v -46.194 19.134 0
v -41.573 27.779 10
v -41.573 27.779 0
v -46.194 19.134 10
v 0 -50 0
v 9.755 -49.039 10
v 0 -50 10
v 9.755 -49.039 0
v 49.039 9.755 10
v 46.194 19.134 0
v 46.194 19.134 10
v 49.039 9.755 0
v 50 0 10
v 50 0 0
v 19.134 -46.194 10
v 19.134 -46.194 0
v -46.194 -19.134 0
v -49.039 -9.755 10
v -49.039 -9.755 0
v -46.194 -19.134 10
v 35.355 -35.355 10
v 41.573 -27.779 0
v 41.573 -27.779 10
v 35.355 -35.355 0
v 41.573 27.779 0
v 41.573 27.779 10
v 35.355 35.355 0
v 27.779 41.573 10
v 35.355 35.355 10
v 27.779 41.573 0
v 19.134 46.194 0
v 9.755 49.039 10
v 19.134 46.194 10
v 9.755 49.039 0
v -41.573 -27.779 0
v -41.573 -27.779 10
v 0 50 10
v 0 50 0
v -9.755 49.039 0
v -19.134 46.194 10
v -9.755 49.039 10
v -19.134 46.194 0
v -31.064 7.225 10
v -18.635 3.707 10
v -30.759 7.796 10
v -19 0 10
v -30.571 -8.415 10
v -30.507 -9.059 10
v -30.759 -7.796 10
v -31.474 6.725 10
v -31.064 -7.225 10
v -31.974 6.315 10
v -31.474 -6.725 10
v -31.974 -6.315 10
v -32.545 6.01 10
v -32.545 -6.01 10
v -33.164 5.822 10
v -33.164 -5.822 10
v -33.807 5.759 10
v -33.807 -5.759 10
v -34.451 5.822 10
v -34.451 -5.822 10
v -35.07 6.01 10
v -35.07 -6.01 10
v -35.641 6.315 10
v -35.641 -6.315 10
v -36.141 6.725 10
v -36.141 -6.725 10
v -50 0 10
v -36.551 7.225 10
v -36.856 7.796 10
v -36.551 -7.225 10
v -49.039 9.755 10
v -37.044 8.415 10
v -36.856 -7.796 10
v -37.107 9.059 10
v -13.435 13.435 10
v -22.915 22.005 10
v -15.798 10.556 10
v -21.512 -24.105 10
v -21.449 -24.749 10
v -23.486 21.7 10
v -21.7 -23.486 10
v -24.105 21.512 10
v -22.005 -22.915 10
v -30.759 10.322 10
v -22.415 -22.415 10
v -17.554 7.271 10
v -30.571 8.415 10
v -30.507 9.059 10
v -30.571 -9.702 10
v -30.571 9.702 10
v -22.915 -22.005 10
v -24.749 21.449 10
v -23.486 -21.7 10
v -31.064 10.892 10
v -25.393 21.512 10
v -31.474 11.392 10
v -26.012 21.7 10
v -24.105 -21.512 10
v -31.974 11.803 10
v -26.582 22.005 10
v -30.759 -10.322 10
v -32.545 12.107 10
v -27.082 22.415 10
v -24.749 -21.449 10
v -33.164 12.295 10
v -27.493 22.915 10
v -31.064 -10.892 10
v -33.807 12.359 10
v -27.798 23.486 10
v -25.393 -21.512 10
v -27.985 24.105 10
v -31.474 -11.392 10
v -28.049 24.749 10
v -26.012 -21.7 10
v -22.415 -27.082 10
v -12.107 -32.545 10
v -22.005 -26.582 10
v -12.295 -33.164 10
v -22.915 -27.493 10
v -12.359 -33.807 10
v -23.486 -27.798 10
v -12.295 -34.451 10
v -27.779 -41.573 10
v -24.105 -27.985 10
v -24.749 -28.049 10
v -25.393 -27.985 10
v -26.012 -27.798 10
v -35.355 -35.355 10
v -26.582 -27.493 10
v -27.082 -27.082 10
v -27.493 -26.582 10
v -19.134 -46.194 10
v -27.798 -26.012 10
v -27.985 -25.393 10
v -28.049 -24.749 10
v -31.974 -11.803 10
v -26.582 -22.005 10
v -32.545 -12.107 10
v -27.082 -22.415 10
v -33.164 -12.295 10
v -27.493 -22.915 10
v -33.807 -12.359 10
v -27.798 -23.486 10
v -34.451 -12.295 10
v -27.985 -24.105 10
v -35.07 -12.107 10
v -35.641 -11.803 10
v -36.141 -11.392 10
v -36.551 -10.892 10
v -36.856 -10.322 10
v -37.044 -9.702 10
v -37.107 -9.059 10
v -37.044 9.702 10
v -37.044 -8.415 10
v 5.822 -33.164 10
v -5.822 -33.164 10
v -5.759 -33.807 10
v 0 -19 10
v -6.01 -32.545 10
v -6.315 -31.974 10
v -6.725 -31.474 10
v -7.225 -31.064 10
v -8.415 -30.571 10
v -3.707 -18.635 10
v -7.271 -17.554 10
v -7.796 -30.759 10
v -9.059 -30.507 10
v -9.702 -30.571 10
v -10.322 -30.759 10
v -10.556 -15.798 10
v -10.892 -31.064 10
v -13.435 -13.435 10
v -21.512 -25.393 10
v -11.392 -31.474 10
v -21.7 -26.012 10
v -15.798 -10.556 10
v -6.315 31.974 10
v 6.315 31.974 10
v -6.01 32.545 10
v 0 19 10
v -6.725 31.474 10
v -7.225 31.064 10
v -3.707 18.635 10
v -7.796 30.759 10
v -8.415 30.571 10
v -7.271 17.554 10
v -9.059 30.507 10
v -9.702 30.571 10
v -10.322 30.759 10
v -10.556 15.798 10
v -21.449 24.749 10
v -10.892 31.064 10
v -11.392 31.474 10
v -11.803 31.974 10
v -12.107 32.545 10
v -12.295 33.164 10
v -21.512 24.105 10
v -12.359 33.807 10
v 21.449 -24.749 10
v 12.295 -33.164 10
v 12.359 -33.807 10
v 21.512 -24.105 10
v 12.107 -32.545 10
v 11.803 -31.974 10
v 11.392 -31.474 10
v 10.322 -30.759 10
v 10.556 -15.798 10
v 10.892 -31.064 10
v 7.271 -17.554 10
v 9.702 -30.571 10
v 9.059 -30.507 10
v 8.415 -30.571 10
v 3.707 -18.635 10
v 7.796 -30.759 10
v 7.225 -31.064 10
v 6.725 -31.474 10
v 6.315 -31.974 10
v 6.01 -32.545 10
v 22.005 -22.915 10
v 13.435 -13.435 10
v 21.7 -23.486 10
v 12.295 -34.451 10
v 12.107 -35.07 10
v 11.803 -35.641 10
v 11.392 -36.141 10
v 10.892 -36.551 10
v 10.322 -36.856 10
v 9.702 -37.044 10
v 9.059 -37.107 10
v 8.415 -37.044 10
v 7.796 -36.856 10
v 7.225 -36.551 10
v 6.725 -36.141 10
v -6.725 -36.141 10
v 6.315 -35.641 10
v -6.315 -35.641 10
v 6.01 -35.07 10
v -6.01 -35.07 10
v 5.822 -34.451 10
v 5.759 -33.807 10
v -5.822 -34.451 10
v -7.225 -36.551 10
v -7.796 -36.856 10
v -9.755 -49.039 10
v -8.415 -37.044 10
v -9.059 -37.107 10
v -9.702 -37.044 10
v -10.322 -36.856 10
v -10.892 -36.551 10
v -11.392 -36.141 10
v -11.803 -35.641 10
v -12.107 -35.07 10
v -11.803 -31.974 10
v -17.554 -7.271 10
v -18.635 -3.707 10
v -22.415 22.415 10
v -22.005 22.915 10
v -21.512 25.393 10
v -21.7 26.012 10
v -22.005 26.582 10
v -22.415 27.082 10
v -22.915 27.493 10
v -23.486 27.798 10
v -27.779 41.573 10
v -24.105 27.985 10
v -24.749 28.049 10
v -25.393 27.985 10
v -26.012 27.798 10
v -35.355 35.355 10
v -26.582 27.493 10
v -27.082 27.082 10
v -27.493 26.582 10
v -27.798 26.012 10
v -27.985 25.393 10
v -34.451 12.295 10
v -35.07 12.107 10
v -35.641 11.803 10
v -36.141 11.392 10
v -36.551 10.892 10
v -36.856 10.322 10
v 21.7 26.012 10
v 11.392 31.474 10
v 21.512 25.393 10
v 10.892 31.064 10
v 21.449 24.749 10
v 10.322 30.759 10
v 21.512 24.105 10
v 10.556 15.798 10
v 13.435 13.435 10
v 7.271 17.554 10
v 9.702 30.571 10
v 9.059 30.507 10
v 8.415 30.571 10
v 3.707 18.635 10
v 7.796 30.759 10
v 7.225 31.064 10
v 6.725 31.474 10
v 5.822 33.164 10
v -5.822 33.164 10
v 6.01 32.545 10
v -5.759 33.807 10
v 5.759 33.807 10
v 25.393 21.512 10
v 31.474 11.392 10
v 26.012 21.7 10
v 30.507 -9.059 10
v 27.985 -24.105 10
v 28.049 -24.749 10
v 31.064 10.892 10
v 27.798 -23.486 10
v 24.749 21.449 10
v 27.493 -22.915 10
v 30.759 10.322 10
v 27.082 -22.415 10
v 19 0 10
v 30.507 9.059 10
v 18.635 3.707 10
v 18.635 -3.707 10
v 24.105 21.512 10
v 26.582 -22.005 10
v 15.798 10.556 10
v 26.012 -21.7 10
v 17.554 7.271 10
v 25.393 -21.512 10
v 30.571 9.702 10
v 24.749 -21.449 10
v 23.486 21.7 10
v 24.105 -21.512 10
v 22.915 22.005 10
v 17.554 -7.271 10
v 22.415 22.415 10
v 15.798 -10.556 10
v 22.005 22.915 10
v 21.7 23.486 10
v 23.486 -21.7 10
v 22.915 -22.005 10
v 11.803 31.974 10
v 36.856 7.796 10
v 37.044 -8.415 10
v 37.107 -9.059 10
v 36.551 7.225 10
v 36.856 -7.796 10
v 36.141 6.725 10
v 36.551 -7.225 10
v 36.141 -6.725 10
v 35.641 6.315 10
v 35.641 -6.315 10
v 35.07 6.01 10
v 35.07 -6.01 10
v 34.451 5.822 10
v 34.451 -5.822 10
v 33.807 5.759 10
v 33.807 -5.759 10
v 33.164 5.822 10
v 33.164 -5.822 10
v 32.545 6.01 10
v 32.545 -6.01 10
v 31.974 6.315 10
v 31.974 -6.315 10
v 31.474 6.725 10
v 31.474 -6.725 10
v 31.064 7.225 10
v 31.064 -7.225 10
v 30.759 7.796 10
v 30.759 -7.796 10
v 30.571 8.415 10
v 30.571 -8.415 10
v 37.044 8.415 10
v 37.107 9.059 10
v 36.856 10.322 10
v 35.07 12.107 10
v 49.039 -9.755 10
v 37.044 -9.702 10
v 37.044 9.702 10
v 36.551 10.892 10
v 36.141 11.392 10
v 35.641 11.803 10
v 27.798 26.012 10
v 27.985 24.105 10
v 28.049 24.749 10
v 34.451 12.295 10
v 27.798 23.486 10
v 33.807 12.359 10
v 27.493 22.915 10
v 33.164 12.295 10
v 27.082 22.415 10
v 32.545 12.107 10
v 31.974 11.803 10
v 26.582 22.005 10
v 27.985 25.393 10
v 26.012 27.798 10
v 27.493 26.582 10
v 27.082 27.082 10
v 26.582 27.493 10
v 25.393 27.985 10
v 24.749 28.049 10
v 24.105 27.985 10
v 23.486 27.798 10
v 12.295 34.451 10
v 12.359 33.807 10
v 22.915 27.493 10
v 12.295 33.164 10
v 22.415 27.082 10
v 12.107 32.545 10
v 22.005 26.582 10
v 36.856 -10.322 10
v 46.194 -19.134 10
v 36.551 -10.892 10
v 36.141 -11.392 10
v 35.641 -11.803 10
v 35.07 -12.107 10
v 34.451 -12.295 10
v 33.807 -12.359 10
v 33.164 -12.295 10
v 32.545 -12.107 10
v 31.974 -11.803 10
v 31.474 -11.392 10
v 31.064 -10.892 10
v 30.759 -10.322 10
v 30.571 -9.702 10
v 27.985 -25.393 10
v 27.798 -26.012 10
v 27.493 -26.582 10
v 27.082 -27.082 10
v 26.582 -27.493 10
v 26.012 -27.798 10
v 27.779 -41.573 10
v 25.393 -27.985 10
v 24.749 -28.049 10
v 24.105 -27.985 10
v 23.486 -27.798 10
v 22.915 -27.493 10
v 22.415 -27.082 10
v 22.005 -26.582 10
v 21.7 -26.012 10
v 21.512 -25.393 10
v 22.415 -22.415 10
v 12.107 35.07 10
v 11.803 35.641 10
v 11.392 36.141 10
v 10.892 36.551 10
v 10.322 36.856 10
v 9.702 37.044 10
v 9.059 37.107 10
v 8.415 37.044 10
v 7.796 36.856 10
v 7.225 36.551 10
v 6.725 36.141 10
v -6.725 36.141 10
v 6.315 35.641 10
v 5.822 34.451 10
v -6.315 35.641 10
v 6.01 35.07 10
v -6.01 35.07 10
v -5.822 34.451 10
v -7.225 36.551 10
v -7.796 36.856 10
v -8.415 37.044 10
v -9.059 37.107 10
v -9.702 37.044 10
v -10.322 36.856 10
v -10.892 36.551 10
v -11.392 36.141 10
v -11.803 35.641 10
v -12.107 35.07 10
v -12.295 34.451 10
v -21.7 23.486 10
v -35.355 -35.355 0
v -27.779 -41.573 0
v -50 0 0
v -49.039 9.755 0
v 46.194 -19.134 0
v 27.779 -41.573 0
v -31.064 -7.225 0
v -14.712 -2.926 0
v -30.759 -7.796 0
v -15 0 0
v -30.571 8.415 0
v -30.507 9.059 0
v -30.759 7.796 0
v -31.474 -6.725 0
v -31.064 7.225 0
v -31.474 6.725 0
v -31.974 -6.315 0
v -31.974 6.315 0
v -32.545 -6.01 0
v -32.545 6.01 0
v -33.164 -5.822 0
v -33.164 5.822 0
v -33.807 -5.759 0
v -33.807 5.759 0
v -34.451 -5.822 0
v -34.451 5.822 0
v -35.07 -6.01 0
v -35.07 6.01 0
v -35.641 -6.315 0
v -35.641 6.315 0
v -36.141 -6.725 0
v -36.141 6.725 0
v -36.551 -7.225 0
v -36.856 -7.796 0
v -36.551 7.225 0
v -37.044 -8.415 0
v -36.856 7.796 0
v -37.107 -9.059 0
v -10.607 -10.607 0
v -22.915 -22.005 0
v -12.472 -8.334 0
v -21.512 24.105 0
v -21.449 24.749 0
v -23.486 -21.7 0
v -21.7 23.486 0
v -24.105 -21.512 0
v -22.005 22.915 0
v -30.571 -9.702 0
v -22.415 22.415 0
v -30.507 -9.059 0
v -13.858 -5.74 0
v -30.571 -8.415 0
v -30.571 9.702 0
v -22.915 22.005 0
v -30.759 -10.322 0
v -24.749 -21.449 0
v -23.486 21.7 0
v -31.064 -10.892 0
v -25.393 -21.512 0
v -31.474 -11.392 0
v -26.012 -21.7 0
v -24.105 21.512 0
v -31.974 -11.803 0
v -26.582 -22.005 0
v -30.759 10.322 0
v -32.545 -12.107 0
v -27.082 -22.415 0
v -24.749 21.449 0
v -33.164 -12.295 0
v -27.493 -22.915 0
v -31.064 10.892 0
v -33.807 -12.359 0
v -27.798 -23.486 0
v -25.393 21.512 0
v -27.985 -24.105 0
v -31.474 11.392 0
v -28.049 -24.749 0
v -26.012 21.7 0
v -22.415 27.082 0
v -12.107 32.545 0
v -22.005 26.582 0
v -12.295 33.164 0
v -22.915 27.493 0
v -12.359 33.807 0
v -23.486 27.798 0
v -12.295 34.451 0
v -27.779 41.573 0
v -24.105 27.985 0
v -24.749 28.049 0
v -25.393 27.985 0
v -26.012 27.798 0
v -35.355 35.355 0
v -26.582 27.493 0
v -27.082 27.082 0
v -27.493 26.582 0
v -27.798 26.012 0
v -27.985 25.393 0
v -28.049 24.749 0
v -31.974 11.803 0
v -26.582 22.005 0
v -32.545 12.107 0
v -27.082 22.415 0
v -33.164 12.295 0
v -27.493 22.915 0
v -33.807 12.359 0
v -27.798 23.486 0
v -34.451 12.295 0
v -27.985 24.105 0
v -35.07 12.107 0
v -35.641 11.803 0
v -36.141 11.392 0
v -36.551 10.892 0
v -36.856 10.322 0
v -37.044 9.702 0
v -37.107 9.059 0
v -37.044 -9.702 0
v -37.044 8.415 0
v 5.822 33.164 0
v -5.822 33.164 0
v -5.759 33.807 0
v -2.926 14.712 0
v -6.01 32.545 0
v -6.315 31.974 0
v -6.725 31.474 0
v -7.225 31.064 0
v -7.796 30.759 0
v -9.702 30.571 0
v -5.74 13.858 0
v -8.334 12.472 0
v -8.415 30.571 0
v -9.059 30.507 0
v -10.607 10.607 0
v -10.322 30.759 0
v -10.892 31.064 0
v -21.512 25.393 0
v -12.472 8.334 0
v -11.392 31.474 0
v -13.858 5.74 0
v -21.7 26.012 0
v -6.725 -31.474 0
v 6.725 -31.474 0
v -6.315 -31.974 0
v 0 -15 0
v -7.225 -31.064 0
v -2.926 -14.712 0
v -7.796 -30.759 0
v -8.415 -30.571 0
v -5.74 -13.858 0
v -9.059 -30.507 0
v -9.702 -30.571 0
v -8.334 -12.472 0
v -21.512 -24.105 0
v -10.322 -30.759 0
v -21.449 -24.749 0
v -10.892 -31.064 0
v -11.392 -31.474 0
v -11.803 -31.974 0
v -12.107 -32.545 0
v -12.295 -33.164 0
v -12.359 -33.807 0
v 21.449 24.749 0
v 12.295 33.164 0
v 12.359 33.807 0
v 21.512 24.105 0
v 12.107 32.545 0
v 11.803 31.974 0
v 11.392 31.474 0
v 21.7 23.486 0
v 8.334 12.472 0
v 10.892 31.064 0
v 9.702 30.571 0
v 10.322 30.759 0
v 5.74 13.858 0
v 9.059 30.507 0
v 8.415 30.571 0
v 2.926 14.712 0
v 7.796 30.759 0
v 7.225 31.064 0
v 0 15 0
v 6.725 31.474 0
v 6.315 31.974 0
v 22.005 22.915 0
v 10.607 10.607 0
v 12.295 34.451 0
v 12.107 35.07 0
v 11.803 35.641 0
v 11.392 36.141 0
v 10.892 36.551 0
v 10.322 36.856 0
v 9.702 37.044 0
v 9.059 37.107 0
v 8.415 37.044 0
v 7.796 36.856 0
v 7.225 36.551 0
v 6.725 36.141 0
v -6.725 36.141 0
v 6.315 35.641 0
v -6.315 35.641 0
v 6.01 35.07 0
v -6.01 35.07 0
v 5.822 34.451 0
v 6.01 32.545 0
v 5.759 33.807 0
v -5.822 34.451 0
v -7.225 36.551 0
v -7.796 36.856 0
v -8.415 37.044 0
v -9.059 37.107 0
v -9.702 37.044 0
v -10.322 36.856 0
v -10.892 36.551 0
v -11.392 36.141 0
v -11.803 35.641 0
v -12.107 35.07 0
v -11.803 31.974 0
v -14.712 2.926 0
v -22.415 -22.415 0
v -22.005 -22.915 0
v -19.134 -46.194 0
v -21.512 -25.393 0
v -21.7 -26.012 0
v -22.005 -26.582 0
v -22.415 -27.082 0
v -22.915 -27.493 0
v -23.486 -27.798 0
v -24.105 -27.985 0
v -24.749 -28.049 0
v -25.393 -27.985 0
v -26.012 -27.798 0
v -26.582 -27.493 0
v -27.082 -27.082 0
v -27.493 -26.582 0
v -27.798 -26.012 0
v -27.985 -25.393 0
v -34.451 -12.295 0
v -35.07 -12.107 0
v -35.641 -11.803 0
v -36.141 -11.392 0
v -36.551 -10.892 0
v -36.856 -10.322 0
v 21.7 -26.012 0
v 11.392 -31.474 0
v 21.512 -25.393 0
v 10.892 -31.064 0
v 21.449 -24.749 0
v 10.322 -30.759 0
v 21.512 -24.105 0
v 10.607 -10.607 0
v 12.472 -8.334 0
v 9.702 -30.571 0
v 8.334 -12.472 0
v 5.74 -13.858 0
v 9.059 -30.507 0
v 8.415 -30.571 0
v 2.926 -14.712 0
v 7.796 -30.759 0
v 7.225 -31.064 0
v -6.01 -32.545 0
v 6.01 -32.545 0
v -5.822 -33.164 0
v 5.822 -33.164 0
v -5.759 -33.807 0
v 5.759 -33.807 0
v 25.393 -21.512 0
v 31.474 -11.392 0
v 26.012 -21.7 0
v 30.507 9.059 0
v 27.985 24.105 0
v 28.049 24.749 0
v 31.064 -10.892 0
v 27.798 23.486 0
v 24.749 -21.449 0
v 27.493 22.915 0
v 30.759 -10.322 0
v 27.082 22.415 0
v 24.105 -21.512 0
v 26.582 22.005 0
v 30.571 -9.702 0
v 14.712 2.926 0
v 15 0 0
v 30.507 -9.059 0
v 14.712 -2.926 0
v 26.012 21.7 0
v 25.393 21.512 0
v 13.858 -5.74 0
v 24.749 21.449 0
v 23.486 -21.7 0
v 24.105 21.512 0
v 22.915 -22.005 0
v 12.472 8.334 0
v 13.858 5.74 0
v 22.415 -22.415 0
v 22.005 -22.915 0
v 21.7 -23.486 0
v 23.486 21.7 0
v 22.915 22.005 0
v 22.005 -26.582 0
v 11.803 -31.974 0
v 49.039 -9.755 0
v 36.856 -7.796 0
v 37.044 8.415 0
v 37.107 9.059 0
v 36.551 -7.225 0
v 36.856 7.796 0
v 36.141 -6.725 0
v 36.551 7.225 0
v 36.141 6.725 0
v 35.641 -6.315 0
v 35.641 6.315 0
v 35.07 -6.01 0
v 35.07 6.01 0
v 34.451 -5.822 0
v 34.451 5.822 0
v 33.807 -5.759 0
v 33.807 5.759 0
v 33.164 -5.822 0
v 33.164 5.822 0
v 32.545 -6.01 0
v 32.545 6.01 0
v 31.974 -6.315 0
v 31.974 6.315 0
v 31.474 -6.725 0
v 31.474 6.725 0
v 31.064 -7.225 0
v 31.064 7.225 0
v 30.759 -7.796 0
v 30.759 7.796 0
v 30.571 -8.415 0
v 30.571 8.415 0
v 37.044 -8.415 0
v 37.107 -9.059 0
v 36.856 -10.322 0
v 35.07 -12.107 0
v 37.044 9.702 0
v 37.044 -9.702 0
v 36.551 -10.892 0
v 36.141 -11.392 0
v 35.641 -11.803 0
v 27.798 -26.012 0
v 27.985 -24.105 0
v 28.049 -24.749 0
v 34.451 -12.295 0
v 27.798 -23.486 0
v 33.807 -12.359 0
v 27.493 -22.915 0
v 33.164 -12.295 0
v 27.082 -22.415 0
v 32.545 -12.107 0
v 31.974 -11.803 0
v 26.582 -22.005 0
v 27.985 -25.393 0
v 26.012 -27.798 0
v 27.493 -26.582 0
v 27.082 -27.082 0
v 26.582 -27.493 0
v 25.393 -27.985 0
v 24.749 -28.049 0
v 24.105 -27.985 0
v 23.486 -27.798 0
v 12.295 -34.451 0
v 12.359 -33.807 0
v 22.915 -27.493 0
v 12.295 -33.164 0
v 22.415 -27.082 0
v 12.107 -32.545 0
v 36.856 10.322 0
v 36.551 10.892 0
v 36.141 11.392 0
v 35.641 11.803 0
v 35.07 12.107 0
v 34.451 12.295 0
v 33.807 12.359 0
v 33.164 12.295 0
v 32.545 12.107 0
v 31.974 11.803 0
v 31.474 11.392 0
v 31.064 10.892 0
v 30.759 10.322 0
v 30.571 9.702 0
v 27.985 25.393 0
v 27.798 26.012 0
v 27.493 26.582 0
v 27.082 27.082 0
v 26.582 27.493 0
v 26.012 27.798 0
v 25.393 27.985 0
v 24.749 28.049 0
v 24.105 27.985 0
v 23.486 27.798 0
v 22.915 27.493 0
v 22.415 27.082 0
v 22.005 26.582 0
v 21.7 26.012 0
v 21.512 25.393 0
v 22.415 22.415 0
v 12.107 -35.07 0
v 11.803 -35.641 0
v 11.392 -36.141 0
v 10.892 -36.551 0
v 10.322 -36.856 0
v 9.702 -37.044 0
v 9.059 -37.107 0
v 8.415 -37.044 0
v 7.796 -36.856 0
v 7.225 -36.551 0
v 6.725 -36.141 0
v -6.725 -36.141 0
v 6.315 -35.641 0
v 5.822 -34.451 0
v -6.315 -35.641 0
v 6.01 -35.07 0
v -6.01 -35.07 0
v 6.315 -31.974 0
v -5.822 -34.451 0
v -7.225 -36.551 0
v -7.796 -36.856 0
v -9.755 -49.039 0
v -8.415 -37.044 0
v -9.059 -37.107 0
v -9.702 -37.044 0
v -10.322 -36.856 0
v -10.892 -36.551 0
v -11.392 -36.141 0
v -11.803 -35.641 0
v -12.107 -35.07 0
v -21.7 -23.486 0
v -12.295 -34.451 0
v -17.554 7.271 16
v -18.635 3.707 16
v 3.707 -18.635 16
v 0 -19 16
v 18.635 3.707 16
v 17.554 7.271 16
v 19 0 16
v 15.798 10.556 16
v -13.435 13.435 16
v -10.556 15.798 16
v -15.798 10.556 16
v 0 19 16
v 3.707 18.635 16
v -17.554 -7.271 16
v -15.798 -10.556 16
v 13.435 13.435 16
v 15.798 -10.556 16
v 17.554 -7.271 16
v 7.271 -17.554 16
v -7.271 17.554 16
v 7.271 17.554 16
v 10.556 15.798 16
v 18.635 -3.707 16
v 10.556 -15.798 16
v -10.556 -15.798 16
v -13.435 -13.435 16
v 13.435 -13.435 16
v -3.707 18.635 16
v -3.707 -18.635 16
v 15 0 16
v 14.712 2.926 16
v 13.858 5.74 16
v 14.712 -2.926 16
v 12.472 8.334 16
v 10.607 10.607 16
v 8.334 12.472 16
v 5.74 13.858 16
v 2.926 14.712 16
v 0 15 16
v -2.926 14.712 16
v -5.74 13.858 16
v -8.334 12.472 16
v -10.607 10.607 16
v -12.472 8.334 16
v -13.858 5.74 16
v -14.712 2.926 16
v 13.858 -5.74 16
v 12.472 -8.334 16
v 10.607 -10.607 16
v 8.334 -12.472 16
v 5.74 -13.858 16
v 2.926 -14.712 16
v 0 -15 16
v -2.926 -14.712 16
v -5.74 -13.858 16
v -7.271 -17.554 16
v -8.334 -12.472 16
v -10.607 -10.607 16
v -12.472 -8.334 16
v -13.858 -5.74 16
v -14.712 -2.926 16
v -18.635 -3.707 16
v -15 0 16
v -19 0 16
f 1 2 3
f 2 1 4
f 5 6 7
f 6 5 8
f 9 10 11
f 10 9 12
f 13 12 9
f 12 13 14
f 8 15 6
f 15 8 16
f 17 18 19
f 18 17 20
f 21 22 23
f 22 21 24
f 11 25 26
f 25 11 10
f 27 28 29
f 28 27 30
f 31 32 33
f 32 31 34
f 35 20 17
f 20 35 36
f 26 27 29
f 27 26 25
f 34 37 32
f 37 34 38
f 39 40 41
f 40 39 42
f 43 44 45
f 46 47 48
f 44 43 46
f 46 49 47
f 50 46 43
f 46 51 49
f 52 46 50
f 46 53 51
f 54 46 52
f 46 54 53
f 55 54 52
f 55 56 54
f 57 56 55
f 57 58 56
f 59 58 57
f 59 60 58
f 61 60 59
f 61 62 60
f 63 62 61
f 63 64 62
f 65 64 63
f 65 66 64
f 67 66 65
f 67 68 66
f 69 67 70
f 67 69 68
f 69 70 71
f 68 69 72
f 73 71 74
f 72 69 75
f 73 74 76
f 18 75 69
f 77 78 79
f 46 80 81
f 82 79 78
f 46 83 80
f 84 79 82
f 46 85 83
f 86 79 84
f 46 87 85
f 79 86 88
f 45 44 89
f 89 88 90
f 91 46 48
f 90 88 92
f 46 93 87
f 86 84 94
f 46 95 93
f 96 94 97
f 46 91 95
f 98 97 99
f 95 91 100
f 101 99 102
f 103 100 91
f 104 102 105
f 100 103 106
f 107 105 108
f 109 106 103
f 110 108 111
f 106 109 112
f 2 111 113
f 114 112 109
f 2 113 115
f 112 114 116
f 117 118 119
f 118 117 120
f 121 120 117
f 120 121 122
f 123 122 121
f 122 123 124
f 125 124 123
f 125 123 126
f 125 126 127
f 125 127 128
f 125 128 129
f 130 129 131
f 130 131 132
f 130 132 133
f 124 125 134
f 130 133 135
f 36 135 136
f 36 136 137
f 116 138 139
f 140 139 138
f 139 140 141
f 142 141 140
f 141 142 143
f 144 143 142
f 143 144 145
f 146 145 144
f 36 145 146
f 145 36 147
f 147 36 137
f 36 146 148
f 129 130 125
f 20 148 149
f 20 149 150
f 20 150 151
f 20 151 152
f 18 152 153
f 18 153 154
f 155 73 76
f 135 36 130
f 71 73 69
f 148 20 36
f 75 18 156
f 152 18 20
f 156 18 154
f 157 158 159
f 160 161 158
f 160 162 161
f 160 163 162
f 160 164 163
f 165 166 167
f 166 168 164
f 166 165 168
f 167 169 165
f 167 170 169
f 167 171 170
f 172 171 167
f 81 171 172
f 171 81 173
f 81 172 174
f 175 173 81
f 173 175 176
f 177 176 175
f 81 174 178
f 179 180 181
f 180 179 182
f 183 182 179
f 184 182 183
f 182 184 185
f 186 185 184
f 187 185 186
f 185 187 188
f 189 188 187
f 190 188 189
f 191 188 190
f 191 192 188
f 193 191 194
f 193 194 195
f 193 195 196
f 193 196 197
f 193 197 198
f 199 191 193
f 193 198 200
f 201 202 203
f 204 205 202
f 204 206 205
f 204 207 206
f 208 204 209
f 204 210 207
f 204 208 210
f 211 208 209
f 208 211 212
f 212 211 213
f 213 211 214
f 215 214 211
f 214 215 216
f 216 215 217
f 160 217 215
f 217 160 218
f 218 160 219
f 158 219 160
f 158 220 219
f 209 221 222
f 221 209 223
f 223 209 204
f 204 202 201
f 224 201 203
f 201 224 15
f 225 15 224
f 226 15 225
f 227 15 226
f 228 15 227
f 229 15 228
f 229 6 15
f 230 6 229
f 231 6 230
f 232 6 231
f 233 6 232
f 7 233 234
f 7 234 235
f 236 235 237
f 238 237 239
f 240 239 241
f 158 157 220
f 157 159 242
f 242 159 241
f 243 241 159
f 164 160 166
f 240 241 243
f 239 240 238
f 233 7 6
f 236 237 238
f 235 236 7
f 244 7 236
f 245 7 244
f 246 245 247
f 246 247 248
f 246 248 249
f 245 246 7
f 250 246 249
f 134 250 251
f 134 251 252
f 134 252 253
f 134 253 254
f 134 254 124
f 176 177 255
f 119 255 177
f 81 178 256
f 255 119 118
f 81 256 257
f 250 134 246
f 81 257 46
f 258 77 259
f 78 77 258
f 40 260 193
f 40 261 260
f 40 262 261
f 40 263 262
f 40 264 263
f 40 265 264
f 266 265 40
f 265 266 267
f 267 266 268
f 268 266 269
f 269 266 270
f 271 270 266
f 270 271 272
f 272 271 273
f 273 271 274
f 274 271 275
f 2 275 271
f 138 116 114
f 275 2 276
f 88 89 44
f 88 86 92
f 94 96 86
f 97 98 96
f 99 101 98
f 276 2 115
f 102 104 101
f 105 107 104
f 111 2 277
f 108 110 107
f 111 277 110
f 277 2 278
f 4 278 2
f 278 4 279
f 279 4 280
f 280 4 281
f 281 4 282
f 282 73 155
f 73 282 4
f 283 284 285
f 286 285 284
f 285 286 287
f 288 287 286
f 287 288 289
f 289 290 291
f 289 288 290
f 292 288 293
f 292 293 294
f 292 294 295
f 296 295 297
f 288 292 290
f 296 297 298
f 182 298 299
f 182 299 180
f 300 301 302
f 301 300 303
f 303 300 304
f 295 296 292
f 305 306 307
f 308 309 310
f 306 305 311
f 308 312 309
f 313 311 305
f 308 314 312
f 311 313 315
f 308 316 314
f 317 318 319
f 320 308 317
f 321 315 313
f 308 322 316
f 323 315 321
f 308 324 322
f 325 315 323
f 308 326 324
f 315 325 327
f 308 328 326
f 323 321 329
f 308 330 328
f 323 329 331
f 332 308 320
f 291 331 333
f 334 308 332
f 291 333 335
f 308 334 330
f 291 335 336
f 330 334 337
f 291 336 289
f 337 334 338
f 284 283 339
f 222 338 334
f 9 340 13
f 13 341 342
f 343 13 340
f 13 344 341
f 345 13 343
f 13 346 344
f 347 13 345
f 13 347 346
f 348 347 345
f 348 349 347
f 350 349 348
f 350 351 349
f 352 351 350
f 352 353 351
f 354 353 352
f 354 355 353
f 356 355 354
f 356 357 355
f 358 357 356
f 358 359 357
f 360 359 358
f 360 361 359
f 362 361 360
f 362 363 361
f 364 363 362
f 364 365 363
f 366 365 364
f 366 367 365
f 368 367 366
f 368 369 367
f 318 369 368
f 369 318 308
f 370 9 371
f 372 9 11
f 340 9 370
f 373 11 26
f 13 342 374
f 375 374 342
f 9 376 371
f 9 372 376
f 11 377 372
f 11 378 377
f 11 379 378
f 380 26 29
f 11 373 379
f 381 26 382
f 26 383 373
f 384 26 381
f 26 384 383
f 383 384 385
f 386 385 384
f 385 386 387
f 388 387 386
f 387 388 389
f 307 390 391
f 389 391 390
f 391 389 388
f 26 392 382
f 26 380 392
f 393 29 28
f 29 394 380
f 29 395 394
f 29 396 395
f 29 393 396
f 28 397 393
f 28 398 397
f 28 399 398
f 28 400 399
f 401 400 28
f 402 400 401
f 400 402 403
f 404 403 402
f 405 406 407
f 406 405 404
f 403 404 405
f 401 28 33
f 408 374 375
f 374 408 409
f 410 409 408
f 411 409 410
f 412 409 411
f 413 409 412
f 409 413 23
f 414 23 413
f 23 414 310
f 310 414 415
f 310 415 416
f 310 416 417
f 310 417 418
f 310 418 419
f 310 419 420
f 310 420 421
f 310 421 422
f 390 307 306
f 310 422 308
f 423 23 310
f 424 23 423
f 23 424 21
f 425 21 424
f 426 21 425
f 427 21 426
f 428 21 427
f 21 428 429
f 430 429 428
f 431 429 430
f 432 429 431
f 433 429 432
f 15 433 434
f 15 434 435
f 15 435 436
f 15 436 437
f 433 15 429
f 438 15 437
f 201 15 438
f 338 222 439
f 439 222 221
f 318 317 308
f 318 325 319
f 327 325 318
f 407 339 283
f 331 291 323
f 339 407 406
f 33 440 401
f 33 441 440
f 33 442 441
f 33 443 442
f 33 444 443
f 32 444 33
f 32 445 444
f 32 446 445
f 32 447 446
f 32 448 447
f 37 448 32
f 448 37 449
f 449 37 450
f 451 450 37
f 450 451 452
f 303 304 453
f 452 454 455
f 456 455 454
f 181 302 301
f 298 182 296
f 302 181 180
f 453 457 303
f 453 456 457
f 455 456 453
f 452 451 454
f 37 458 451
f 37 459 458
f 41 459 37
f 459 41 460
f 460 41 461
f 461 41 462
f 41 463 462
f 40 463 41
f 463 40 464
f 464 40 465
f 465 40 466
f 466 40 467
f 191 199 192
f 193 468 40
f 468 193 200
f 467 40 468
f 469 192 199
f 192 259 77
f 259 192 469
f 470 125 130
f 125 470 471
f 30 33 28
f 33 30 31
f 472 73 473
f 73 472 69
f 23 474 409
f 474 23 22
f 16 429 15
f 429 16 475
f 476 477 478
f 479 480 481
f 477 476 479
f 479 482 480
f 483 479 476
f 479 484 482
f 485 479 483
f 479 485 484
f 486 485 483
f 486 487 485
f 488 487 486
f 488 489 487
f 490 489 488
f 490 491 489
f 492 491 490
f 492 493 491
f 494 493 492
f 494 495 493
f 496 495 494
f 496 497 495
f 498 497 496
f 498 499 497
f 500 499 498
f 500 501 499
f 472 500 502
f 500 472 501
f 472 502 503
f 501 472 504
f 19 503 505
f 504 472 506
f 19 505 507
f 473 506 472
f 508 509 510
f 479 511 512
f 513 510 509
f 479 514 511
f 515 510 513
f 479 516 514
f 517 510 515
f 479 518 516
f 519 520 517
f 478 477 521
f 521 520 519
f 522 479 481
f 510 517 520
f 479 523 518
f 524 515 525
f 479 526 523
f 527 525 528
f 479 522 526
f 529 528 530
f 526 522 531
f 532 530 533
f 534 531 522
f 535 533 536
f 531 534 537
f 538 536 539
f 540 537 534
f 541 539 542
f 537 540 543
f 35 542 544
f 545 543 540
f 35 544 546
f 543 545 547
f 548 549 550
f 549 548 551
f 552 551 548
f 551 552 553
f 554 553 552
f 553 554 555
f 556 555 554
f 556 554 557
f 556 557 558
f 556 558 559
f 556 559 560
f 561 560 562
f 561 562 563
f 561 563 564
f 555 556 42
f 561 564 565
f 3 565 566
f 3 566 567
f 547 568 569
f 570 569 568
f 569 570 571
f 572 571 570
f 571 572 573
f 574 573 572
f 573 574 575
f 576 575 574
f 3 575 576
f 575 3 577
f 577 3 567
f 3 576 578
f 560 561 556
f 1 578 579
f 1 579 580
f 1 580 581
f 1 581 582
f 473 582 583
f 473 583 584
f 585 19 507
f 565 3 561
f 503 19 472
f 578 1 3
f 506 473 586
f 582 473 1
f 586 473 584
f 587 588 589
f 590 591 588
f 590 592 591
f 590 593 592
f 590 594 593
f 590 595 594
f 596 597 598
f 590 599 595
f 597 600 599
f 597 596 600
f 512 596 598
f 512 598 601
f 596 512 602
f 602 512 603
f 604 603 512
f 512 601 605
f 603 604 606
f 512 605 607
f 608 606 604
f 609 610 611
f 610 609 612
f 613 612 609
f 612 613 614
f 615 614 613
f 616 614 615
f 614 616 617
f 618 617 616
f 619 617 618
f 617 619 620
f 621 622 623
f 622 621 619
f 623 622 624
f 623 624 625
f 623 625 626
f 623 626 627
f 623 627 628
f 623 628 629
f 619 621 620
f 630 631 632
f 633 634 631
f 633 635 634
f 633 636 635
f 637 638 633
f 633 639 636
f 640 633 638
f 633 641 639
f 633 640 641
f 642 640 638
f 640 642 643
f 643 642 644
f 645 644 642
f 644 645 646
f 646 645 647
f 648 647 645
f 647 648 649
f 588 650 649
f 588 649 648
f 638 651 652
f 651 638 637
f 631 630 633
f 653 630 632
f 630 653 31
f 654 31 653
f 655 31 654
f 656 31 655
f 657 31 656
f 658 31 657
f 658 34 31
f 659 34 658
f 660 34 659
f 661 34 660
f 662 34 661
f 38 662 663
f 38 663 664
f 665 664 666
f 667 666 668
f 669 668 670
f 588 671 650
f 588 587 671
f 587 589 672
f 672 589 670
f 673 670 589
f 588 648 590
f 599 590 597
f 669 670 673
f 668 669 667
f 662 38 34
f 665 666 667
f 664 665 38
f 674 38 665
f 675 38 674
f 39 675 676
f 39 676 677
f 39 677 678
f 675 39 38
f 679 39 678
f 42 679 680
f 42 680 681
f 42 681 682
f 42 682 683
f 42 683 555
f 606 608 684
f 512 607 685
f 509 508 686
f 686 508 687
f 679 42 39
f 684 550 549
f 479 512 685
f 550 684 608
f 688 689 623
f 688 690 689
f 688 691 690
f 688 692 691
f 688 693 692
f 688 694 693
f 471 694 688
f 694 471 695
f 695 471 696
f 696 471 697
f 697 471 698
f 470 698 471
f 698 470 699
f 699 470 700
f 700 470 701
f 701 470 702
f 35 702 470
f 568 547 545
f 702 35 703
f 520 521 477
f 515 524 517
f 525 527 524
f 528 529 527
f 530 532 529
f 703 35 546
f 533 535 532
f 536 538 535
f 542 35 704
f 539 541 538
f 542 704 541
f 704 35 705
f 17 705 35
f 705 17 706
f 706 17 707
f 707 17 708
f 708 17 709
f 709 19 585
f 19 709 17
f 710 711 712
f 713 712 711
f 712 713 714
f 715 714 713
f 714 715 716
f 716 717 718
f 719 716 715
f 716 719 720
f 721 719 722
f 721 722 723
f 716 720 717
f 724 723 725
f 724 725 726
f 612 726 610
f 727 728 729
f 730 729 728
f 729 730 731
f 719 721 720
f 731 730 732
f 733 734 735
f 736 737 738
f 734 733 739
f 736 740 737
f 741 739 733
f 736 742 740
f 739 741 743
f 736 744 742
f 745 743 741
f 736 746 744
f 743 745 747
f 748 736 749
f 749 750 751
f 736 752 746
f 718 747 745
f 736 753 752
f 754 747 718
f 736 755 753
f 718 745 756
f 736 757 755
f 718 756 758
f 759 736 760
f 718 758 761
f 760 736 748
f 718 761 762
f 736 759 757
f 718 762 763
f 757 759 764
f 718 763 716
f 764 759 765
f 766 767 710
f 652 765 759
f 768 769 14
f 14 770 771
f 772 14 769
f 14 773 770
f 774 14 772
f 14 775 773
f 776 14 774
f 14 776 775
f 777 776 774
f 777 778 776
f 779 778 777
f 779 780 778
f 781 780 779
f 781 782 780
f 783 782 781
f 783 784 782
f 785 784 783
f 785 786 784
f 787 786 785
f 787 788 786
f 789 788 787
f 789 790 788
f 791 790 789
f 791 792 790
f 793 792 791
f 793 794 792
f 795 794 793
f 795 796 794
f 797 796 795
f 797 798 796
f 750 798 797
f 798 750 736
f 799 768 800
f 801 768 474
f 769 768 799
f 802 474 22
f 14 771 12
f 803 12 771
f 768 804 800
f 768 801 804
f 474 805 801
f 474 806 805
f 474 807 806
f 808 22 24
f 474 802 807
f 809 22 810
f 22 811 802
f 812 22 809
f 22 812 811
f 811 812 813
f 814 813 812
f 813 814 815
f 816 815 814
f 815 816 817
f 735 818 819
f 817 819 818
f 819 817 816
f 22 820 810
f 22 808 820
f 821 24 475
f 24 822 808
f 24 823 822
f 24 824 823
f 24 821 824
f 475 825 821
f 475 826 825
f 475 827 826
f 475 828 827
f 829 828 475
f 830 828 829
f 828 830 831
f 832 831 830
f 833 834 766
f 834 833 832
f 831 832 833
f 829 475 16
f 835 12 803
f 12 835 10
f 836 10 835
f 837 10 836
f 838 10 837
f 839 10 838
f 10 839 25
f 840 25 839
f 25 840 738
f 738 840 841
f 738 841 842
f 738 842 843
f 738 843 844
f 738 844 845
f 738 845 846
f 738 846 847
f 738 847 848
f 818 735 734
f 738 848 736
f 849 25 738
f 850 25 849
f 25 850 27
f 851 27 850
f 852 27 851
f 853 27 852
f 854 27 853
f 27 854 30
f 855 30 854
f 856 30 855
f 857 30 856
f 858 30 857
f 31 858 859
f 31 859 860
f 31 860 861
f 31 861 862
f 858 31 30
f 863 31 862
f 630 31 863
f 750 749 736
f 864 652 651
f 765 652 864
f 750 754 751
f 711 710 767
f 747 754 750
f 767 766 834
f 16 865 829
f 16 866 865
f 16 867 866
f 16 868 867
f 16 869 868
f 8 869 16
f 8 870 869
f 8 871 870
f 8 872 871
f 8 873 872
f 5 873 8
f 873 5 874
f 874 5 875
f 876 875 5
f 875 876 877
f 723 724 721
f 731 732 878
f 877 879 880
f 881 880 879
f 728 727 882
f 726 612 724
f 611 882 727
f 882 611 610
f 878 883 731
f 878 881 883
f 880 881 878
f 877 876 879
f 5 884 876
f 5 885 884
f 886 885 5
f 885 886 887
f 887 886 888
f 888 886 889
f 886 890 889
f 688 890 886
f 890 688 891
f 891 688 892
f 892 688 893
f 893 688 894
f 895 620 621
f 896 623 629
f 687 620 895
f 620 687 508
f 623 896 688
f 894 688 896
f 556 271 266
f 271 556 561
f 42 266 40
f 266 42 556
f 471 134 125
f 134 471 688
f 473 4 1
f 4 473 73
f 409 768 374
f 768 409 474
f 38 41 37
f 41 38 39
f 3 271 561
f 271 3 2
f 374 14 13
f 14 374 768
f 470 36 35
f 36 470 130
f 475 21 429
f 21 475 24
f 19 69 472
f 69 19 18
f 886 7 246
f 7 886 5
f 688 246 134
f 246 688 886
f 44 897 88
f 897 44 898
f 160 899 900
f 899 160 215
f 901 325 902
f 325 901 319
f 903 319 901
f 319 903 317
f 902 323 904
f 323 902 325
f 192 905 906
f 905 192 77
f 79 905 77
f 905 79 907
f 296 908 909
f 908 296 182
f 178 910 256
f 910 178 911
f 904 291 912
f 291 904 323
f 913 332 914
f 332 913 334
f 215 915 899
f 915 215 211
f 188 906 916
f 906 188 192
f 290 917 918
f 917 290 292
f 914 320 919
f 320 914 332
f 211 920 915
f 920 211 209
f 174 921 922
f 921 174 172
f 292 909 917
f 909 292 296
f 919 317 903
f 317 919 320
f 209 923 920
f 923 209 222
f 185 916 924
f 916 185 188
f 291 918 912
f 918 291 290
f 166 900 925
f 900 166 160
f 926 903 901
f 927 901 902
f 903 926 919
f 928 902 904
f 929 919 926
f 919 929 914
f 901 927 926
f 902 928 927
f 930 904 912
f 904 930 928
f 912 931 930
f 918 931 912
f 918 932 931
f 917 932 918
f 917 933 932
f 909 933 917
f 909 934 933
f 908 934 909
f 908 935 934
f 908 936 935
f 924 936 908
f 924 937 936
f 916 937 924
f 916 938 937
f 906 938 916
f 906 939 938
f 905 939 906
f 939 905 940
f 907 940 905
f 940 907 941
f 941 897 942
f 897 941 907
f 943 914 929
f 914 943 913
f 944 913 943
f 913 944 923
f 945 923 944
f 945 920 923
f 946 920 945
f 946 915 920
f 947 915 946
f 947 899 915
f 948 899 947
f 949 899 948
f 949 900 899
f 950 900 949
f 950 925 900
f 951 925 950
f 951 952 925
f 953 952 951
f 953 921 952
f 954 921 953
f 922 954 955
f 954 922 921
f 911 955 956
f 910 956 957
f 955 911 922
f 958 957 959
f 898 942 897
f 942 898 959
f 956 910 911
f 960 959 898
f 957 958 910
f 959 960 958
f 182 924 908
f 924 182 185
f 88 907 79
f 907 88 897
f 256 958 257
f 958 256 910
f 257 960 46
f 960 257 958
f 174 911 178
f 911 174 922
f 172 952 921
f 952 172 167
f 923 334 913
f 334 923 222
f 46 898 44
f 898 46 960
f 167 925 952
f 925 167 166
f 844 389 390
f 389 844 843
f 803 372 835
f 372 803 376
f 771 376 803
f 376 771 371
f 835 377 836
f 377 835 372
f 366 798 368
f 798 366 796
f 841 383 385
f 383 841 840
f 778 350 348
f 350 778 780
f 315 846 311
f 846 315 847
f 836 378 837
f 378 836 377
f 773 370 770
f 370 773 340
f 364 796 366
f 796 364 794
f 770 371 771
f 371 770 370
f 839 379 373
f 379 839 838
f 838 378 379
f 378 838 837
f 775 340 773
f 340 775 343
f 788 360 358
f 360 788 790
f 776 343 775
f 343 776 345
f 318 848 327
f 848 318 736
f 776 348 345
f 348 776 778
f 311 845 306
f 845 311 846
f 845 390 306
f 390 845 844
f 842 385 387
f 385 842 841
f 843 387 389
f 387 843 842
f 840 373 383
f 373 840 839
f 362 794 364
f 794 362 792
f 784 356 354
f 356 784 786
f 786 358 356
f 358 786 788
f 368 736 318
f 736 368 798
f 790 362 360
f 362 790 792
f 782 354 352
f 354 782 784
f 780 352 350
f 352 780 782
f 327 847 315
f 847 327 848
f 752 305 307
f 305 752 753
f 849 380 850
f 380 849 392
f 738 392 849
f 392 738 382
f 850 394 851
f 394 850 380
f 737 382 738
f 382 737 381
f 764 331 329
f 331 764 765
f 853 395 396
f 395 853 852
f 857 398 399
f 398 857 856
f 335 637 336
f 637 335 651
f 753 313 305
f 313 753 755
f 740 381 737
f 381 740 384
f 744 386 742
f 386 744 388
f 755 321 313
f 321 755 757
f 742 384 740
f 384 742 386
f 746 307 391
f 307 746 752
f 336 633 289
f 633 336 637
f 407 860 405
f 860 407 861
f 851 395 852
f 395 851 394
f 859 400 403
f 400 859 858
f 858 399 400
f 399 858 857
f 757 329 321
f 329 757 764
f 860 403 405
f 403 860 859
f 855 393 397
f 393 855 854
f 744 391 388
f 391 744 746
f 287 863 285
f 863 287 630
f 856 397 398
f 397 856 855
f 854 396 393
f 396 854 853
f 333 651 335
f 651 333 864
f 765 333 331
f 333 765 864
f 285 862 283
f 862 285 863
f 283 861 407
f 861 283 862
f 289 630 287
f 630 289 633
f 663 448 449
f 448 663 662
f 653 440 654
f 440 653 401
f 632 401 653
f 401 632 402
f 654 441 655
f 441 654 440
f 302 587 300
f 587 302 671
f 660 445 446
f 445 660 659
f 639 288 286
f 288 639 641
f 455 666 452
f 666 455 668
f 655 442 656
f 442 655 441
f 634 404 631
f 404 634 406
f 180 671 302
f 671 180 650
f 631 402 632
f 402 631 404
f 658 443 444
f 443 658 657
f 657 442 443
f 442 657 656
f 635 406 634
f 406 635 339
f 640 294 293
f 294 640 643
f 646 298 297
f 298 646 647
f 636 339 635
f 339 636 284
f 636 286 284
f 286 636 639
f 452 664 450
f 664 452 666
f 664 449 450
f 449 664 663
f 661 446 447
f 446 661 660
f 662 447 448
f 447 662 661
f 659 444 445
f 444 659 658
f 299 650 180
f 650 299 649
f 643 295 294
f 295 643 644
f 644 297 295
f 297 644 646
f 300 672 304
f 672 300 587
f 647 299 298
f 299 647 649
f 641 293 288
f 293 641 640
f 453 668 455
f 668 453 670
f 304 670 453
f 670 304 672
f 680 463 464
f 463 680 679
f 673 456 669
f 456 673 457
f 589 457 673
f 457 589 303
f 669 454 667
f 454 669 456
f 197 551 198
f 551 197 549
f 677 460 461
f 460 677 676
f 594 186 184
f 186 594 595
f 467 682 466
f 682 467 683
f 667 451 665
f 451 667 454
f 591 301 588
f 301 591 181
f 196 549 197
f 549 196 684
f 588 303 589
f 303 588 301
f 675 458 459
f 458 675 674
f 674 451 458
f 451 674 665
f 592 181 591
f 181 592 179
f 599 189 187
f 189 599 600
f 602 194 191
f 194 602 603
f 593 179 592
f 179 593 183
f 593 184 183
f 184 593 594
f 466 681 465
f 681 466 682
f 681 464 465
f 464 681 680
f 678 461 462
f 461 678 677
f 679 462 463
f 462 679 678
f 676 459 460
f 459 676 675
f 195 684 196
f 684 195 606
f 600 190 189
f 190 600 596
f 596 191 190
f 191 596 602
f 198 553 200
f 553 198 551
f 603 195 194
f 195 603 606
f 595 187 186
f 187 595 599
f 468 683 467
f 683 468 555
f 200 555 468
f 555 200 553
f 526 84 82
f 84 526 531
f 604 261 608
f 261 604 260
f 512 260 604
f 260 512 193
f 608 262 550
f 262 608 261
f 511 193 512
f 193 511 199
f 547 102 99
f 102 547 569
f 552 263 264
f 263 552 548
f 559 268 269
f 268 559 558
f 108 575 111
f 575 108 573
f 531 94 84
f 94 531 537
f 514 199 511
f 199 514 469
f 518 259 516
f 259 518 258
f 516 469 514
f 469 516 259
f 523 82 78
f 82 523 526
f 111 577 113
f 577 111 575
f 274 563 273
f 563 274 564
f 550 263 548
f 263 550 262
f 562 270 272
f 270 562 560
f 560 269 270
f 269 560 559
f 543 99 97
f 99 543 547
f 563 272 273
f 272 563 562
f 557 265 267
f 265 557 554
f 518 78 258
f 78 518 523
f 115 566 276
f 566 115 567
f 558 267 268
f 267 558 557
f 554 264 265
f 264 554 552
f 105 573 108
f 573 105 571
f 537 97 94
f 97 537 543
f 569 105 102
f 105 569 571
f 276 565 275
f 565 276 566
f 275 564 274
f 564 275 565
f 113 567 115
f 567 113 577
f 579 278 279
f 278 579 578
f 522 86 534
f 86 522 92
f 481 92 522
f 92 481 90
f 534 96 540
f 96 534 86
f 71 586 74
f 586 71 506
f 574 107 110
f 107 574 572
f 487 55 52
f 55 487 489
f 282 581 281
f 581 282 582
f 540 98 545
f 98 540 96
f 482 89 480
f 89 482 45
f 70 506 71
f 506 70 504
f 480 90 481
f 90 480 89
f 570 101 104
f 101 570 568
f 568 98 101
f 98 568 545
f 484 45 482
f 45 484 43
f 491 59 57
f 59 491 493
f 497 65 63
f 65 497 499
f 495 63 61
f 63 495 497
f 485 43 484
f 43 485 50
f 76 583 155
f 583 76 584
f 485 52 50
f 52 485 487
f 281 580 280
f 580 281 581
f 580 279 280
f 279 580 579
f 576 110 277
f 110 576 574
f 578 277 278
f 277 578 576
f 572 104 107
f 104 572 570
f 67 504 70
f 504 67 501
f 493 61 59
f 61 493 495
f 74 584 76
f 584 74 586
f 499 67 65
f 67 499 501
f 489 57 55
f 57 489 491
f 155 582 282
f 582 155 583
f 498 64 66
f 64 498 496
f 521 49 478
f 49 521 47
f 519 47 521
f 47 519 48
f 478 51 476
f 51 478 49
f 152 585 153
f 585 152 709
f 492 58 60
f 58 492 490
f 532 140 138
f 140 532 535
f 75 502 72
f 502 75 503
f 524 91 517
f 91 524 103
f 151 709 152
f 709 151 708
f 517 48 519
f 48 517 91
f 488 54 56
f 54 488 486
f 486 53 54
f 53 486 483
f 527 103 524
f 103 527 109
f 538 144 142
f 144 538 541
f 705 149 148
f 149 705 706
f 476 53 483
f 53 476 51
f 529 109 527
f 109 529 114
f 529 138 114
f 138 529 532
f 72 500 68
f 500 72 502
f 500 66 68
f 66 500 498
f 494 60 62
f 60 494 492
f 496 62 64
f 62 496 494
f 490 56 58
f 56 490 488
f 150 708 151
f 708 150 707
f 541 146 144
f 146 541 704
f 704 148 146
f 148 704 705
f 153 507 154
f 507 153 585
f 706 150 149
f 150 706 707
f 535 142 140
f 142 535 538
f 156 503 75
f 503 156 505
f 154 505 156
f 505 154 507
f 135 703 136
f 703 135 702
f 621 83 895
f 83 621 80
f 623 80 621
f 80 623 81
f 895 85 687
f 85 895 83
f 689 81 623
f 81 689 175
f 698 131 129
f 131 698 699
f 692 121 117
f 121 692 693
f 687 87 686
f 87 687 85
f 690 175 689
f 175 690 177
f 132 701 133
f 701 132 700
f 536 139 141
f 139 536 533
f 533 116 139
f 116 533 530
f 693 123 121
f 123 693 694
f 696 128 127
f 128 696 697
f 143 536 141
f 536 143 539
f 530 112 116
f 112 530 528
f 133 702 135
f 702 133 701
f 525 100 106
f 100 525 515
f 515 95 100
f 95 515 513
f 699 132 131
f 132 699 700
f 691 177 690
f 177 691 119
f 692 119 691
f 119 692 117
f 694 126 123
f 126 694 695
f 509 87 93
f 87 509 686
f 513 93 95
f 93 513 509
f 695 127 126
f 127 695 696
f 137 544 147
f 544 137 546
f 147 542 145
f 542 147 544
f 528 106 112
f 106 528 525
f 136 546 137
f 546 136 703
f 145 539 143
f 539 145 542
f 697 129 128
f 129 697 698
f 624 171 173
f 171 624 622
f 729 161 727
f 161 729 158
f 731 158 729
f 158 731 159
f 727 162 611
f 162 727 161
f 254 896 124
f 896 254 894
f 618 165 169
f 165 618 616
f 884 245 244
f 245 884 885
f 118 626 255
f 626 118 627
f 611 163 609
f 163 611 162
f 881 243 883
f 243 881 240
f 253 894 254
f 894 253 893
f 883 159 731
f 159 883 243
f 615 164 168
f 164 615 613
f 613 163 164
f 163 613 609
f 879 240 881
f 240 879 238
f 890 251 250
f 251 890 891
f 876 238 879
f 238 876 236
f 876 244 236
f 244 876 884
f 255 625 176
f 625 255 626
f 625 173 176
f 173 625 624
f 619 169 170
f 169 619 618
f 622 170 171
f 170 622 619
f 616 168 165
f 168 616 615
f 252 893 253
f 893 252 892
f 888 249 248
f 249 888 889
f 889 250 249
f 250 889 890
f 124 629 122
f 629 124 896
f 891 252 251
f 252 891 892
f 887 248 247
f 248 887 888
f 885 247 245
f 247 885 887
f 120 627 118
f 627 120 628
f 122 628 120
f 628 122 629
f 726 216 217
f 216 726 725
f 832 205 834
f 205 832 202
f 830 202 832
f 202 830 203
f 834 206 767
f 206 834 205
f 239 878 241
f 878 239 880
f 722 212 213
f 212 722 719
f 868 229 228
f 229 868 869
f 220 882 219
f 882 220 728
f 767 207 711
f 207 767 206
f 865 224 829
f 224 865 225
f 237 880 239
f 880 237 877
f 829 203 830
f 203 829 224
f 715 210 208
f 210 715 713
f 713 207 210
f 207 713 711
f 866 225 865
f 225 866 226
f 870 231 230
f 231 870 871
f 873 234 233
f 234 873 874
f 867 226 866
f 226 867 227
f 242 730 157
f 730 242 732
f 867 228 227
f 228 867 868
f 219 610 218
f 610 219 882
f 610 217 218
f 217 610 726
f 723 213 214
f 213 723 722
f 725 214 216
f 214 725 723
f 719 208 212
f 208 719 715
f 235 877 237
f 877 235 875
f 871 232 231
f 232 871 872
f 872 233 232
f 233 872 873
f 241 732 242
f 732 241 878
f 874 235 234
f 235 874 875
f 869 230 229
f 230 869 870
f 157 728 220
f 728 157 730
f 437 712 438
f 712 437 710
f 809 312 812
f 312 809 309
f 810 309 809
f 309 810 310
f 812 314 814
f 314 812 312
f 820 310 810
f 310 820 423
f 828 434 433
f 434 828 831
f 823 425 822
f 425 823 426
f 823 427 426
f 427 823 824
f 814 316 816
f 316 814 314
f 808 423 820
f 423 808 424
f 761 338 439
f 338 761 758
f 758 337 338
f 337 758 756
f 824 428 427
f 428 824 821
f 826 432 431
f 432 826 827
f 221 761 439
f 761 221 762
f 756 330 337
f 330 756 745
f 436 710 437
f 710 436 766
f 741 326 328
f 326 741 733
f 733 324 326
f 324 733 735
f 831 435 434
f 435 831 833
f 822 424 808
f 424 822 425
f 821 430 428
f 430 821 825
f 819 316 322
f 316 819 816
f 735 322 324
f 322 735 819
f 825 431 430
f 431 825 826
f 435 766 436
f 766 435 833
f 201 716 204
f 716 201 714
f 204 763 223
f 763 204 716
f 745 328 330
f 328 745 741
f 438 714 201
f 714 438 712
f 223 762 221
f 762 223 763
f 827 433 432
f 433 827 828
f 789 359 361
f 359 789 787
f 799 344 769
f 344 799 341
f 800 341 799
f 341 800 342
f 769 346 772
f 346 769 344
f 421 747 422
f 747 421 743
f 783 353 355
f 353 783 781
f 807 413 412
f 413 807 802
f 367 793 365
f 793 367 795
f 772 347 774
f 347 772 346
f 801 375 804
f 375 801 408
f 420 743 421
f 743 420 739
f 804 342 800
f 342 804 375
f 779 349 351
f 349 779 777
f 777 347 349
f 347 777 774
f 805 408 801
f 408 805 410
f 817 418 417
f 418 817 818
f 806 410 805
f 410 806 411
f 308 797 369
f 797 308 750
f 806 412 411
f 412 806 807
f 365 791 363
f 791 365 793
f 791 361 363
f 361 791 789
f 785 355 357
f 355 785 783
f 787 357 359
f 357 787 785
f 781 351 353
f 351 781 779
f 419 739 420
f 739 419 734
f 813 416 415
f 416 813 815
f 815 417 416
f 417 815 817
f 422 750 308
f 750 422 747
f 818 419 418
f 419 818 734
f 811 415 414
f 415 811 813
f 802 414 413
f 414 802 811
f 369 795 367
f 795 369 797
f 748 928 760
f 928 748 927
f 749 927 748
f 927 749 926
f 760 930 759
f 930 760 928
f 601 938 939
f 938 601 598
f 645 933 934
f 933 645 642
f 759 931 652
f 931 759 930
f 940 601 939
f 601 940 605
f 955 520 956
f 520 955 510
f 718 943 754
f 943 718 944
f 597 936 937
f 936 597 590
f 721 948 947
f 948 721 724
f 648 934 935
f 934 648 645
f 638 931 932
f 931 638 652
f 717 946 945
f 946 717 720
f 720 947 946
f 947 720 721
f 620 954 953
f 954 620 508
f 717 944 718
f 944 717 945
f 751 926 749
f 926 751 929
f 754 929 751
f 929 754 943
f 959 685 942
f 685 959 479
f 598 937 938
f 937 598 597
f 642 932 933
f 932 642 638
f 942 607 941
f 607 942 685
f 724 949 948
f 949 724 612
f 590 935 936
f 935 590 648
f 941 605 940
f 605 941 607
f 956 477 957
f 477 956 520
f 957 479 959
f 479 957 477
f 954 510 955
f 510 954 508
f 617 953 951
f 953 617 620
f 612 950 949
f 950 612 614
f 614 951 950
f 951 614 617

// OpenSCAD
$fn = 32;

// ----------------------------------------------------------------------
// Flange Ø100 x 10
// 12 holes on a Ø70 bolt circle, bolted joints
// ----------------------------------------------------------------------

// --- parameters (mm) ---
flange_d = 100;  // outside diameter of the flange
thickness = 10;  // flange thickness
holes = 12;      // number of bolt holes
pcd = 70;        // bolt circle diameter
start_deg = 15;  // angle of the first hole, from +X
hole_d = 6.6;    // bolt hole diameter
bore_d = 30;     // central through bore
hub_d = 38;      // hub outside diameter
hub_h = 6;       // hub height above the flange face (0 = no hub)

// --- derived feature positions (mm) ---
height = thickness + hub_h;  // = 16   overall height of the part
pcd_r = pcd / 2;             // = 35   bolt circle radius
hole_step = 360 / holes;     // = 30   angular pitch
feature_centers = [
  [pcd_r * cos(start_deg + 0 * hole_step), pcd_r * sin(start_deg + 0 * hole_step)],
  [pcd_r * cos(start_deg + 1 * hole_step), pcd_r * sin(start_deg + 1 * hole_step)],
  [pcd_r * cos(start_deg + 2 * hole_step), pcd_r * sin(start_deg + 2 * hole_step)],
  [pcd_r * cos(start_deg + 3 * hole_step), pcd_r * sin(start_deg + 3 * hole_step)],
  [pcd_r * cos(start_deg + 4 * hole_step), pcd_r * sin(start_deg + 4 * hole_step)],
  [pcd_r * cos(start_deg + 5 * hole_step), pcd_r * sin(start_deg + 5 * hole_step)],
  [pcd_r * cos(start_deg + 6 * hole_step), pcd_r * sin(start_deg + 6 * hole_step)],
  [pcd_r * cos(start_deg + 7 * hole_step), pcd_r * sin(start_deg + 7 * hole_step)],
  [pcd_r * cos(start_deg + 8 * hole_step), pcd_r * sin(start_deg + 8 * hole_step)],
  [pcd_r * cos(start_deg + 9 * hole_step), pcd_r * sin(start_deg + 9 * hole_step)],
  [pcd_r * cos(start_deg + 10 * hole_step), pcd_r * sin(start_deg + 10 * hole_step)],
  [pcd_r * cos(start_deg + 11 * hole_step), pcd_r * sin(start_deg + 11 * hole_step)]
];   // bolt hole centres on the pitch circle

// flange disc, every hole and the bore cut straight through
difference() {
  union() {
    cylinder(d = flange_d, h = thickness);
    cylinder(d = hub_d, h = height);  // hub, overlapped into the flange
  }
  translate([0, 0, -1]) cylinder(d = bore_d, h = height + 2);  // bore, through
  for (centre = feature_centers)
    translate([centre[0], centre[1], -1]) cylinder(d = hole_d, h = thickness + 2);
}
